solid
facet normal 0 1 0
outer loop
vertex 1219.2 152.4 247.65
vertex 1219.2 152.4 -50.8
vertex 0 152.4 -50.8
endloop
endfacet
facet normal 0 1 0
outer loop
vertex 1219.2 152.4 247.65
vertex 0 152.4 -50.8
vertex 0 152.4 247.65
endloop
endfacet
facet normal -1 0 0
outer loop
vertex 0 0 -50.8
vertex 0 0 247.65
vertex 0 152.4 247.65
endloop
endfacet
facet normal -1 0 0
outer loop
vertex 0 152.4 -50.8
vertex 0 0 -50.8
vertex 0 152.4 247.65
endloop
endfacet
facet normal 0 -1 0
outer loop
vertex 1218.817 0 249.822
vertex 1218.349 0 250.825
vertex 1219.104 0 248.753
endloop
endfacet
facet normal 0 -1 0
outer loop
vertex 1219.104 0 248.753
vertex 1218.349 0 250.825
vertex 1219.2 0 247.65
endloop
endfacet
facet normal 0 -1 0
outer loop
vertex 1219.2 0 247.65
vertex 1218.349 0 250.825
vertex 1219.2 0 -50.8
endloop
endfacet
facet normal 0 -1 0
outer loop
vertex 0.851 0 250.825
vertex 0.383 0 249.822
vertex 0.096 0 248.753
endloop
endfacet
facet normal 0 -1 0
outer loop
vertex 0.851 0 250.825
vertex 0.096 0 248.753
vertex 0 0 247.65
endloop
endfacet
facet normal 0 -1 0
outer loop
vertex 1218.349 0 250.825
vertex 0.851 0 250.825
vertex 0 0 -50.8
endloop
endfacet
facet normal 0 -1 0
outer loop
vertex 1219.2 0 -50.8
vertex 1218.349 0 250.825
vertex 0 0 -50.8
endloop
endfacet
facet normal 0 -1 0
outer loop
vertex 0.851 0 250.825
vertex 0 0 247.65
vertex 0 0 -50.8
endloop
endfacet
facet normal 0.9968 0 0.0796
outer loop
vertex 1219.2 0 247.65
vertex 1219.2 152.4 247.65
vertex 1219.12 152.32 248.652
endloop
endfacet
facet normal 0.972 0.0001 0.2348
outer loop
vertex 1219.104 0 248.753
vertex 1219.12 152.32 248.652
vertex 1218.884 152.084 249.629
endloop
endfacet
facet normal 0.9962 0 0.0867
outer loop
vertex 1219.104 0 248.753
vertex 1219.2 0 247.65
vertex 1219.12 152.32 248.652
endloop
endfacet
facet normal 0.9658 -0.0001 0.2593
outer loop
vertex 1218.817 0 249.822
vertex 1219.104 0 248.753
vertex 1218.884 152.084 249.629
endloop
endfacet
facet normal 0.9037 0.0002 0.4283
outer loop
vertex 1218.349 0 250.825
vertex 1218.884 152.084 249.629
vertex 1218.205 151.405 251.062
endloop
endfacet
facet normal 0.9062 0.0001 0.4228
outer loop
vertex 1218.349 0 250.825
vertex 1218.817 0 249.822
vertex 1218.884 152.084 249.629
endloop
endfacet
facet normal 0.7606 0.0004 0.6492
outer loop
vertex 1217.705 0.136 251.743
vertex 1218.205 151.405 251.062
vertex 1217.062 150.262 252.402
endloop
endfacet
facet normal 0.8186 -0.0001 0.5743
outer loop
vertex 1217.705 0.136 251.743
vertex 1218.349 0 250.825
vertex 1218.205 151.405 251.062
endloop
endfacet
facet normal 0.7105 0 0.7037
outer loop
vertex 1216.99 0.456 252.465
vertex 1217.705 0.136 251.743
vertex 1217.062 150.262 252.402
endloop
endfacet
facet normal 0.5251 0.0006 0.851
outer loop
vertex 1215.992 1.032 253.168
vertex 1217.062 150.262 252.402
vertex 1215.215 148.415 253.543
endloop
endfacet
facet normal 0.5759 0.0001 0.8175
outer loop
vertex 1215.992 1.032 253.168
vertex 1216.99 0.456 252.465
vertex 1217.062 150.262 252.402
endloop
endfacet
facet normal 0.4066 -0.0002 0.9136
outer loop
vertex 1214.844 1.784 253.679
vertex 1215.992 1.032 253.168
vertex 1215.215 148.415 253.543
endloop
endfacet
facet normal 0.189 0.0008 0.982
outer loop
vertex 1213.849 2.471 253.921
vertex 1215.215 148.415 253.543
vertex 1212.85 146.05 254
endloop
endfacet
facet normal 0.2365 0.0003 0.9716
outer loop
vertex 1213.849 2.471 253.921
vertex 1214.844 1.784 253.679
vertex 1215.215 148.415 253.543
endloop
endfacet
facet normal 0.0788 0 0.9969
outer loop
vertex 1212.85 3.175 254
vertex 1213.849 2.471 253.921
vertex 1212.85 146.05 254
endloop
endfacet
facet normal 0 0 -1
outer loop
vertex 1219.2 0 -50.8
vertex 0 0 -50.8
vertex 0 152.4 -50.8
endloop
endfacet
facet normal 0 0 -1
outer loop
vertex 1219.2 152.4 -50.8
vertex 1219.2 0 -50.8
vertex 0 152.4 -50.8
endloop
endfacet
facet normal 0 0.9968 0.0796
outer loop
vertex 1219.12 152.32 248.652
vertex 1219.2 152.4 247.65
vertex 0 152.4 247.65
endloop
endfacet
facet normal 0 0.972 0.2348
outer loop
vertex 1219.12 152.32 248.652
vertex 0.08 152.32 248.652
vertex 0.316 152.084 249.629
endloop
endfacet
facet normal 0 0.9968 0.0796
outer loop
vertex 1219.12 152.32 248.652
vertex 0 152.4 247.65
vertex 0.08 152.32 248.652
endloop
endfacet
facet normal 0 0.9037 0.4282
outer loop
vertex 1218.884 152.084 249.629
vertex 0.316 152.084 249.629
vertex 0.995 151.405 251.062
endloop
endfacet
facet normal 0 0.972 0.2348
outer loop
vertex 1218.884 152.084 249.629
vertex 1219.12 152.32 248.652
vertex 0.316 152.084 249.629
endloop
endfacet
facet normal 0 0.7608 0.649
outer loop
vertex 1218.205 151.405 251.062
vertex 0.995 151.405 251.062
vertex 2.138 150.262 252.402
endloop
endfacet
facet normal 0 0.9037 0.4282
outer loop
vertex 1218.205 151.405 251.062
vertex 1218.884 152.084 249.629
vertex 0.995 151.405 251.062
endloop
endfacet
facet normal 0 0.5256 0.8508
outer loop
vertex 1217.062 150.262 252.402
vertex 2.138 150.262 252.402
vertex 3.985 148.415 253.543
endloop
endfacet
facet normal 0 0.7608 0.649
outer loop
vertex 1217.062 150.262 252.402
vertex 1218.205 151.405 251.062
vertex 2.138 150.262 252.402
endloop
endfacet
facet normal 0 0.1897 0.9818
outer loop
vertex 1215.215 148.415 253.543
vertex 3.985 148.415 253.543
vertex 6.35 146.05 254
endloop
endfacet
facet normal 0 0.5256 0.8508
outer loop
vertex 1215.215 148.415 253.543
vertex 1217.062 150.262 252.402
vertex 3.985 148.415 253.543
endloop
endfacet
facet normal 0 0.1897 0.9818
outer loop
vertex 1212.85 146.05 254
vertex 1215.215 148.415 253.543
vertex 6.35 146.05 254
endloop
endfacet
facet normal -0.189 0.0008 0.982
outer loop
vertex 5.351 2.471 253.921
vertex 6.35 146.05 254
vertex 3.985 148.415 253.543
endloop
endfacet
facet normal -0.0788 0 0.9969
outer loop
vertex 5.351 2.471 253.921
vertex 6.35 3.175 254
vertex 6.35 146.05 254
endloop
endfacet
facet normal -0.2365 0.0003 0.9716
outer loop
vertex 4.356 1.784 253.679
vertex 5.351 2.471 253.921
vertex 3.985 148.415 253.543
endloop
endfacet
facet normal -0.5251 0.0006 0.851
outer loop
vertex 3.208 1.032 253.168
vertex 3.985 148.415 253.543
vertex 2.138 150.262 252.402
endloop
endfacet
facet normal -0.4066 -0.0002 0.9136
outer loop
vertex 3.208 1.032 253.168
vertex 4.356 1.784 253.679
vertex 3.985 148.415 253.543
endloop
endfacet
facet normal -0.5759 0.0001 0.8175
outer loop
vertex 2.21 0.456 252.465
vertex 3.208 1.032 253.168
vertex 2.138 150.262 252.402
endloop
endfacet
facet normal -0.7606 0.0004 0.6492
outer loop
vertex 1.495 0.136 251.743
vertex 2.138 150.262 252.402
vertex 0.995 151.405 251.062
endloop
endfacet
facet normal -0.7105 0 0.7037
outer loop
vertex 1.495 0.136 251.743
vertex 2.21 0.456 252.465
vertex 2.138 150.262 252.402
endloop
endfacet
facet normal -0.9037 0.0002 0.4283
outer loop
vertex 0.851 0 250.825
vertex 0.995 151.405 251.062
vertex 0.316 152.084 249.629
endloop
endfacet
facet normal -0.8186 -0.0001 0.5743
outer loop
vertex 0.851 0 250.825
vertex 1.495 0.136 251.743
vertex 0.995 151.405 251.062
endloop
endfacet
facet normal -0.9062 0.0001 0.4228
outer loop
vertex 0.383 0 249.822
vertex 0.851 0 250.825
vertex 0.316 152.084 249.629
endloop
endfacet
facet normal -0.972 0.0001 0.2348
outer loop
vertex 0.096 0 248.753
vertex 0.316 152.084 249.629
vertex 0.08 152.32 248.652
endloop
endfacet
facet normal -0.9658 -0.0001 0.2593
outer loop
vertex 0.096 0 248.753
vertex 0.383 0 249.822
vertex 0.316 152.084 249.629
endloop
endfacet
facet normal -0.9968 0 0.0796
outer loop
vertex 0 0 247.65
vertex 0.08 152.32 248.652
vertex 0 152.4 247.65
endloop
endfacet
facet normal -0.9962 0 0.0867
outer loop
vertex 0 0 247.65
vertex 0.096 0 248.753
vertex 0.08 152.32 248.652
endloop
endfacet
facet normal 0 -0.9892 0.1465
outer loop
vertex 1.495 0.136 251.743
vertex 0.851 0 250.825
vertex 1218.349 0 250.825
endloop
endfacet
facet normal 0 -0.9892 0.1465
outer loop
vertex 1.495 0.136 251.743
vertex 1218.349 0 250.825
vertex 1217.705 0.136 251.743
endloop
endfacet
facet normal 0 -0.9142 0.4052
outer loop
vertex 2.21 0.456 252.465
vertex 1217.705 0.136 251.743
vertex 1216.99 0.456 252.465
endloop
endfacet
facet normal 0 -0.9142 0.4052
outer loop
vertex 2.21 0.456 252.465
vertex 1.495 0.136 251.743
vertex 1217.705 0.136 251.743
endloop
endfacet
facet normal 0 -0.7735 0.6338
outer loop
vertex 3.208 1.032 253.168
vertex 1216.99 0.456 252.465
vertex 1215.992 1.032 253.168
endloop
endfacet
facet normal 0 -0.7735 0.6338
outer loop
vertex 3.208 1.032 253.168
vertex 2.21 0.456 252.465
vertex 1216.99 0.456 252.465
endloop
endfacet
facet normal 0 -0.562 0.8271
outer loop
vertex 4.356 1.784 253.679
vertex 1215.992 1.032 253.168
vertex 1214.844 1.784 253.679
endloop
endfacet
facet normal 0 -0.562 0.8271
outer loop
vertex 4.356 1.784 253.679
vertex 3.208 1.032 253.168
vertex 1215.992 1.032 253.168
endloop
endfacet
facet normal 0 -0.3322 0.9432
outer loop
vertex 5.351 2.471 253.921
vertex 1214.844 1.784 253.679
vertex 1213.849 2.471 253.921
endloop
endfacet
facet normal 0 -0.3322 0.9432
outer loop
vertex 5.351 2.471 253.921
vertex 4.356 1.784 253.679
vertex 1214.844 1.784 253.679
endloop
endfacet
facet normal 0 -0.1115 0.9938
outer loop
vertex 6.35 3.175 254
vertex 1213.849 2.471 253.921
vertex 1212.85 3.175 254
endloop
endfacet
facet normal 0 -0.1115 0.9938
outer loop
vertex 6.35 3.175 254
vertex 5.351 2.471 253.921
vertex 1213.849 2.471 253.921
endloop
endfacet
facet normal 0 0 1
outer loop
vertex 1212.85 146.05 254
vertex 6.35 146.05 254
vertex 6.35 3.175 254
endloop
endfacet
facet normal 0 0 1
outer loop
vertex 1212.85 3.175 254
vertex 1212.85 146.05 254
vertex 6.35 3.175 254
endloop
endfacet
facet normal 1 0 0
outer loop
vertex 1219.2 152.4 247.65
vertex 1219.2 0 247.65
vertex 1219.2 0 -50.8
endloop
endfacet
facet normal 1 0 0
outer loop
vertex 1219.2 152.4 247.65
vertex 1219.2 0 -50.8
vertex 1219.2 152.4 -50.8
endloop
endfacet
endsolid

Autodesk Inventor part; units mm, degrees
ref_plane "YZ Plane" through (0, 0, 0) normal (1, 0, 0) x (0, 1, 0)
ref_plane "XZ Plane" through (0, 0, 0) normal (0, 1, 0) x (-1, 0, 0)
ref_plane "XY Plane" through (0, 0, 0) normal (0, 0, 1) x (1, 0, 0)
sketch "Sketch1" plane through (0, 0, 0) normal (1, 0, 0) x (0, 1, 0)
  line L0 (0, 0) -> (152.4, 0)
  line L1 (152.4, 0) -> (152.4, 254)
  line L2 (152.4, 254) -> (0, 254)
  line L3 (0, 254) -> (0, 0)
  dimension "d0" = 152.4
  dimension "d1" = 254
extrude "Extrusion1" add sketch "Sketch1" along normal blind 1219.2
fillet "Fillet1" radius 6.35 3 edges at (609.6, 152.4, 254) (1219.2, 76.2, 254) (0, 76.2, 254)
fillet "Fillet2" radius 3.175 1 edges at (609.6, 0, 254)
move faces "Move1" translate (0, 0, -50.8) faces at (406.4, 50.8, 0)
properties part number "6in-511LF" material "Granite, Cut, Polished"
